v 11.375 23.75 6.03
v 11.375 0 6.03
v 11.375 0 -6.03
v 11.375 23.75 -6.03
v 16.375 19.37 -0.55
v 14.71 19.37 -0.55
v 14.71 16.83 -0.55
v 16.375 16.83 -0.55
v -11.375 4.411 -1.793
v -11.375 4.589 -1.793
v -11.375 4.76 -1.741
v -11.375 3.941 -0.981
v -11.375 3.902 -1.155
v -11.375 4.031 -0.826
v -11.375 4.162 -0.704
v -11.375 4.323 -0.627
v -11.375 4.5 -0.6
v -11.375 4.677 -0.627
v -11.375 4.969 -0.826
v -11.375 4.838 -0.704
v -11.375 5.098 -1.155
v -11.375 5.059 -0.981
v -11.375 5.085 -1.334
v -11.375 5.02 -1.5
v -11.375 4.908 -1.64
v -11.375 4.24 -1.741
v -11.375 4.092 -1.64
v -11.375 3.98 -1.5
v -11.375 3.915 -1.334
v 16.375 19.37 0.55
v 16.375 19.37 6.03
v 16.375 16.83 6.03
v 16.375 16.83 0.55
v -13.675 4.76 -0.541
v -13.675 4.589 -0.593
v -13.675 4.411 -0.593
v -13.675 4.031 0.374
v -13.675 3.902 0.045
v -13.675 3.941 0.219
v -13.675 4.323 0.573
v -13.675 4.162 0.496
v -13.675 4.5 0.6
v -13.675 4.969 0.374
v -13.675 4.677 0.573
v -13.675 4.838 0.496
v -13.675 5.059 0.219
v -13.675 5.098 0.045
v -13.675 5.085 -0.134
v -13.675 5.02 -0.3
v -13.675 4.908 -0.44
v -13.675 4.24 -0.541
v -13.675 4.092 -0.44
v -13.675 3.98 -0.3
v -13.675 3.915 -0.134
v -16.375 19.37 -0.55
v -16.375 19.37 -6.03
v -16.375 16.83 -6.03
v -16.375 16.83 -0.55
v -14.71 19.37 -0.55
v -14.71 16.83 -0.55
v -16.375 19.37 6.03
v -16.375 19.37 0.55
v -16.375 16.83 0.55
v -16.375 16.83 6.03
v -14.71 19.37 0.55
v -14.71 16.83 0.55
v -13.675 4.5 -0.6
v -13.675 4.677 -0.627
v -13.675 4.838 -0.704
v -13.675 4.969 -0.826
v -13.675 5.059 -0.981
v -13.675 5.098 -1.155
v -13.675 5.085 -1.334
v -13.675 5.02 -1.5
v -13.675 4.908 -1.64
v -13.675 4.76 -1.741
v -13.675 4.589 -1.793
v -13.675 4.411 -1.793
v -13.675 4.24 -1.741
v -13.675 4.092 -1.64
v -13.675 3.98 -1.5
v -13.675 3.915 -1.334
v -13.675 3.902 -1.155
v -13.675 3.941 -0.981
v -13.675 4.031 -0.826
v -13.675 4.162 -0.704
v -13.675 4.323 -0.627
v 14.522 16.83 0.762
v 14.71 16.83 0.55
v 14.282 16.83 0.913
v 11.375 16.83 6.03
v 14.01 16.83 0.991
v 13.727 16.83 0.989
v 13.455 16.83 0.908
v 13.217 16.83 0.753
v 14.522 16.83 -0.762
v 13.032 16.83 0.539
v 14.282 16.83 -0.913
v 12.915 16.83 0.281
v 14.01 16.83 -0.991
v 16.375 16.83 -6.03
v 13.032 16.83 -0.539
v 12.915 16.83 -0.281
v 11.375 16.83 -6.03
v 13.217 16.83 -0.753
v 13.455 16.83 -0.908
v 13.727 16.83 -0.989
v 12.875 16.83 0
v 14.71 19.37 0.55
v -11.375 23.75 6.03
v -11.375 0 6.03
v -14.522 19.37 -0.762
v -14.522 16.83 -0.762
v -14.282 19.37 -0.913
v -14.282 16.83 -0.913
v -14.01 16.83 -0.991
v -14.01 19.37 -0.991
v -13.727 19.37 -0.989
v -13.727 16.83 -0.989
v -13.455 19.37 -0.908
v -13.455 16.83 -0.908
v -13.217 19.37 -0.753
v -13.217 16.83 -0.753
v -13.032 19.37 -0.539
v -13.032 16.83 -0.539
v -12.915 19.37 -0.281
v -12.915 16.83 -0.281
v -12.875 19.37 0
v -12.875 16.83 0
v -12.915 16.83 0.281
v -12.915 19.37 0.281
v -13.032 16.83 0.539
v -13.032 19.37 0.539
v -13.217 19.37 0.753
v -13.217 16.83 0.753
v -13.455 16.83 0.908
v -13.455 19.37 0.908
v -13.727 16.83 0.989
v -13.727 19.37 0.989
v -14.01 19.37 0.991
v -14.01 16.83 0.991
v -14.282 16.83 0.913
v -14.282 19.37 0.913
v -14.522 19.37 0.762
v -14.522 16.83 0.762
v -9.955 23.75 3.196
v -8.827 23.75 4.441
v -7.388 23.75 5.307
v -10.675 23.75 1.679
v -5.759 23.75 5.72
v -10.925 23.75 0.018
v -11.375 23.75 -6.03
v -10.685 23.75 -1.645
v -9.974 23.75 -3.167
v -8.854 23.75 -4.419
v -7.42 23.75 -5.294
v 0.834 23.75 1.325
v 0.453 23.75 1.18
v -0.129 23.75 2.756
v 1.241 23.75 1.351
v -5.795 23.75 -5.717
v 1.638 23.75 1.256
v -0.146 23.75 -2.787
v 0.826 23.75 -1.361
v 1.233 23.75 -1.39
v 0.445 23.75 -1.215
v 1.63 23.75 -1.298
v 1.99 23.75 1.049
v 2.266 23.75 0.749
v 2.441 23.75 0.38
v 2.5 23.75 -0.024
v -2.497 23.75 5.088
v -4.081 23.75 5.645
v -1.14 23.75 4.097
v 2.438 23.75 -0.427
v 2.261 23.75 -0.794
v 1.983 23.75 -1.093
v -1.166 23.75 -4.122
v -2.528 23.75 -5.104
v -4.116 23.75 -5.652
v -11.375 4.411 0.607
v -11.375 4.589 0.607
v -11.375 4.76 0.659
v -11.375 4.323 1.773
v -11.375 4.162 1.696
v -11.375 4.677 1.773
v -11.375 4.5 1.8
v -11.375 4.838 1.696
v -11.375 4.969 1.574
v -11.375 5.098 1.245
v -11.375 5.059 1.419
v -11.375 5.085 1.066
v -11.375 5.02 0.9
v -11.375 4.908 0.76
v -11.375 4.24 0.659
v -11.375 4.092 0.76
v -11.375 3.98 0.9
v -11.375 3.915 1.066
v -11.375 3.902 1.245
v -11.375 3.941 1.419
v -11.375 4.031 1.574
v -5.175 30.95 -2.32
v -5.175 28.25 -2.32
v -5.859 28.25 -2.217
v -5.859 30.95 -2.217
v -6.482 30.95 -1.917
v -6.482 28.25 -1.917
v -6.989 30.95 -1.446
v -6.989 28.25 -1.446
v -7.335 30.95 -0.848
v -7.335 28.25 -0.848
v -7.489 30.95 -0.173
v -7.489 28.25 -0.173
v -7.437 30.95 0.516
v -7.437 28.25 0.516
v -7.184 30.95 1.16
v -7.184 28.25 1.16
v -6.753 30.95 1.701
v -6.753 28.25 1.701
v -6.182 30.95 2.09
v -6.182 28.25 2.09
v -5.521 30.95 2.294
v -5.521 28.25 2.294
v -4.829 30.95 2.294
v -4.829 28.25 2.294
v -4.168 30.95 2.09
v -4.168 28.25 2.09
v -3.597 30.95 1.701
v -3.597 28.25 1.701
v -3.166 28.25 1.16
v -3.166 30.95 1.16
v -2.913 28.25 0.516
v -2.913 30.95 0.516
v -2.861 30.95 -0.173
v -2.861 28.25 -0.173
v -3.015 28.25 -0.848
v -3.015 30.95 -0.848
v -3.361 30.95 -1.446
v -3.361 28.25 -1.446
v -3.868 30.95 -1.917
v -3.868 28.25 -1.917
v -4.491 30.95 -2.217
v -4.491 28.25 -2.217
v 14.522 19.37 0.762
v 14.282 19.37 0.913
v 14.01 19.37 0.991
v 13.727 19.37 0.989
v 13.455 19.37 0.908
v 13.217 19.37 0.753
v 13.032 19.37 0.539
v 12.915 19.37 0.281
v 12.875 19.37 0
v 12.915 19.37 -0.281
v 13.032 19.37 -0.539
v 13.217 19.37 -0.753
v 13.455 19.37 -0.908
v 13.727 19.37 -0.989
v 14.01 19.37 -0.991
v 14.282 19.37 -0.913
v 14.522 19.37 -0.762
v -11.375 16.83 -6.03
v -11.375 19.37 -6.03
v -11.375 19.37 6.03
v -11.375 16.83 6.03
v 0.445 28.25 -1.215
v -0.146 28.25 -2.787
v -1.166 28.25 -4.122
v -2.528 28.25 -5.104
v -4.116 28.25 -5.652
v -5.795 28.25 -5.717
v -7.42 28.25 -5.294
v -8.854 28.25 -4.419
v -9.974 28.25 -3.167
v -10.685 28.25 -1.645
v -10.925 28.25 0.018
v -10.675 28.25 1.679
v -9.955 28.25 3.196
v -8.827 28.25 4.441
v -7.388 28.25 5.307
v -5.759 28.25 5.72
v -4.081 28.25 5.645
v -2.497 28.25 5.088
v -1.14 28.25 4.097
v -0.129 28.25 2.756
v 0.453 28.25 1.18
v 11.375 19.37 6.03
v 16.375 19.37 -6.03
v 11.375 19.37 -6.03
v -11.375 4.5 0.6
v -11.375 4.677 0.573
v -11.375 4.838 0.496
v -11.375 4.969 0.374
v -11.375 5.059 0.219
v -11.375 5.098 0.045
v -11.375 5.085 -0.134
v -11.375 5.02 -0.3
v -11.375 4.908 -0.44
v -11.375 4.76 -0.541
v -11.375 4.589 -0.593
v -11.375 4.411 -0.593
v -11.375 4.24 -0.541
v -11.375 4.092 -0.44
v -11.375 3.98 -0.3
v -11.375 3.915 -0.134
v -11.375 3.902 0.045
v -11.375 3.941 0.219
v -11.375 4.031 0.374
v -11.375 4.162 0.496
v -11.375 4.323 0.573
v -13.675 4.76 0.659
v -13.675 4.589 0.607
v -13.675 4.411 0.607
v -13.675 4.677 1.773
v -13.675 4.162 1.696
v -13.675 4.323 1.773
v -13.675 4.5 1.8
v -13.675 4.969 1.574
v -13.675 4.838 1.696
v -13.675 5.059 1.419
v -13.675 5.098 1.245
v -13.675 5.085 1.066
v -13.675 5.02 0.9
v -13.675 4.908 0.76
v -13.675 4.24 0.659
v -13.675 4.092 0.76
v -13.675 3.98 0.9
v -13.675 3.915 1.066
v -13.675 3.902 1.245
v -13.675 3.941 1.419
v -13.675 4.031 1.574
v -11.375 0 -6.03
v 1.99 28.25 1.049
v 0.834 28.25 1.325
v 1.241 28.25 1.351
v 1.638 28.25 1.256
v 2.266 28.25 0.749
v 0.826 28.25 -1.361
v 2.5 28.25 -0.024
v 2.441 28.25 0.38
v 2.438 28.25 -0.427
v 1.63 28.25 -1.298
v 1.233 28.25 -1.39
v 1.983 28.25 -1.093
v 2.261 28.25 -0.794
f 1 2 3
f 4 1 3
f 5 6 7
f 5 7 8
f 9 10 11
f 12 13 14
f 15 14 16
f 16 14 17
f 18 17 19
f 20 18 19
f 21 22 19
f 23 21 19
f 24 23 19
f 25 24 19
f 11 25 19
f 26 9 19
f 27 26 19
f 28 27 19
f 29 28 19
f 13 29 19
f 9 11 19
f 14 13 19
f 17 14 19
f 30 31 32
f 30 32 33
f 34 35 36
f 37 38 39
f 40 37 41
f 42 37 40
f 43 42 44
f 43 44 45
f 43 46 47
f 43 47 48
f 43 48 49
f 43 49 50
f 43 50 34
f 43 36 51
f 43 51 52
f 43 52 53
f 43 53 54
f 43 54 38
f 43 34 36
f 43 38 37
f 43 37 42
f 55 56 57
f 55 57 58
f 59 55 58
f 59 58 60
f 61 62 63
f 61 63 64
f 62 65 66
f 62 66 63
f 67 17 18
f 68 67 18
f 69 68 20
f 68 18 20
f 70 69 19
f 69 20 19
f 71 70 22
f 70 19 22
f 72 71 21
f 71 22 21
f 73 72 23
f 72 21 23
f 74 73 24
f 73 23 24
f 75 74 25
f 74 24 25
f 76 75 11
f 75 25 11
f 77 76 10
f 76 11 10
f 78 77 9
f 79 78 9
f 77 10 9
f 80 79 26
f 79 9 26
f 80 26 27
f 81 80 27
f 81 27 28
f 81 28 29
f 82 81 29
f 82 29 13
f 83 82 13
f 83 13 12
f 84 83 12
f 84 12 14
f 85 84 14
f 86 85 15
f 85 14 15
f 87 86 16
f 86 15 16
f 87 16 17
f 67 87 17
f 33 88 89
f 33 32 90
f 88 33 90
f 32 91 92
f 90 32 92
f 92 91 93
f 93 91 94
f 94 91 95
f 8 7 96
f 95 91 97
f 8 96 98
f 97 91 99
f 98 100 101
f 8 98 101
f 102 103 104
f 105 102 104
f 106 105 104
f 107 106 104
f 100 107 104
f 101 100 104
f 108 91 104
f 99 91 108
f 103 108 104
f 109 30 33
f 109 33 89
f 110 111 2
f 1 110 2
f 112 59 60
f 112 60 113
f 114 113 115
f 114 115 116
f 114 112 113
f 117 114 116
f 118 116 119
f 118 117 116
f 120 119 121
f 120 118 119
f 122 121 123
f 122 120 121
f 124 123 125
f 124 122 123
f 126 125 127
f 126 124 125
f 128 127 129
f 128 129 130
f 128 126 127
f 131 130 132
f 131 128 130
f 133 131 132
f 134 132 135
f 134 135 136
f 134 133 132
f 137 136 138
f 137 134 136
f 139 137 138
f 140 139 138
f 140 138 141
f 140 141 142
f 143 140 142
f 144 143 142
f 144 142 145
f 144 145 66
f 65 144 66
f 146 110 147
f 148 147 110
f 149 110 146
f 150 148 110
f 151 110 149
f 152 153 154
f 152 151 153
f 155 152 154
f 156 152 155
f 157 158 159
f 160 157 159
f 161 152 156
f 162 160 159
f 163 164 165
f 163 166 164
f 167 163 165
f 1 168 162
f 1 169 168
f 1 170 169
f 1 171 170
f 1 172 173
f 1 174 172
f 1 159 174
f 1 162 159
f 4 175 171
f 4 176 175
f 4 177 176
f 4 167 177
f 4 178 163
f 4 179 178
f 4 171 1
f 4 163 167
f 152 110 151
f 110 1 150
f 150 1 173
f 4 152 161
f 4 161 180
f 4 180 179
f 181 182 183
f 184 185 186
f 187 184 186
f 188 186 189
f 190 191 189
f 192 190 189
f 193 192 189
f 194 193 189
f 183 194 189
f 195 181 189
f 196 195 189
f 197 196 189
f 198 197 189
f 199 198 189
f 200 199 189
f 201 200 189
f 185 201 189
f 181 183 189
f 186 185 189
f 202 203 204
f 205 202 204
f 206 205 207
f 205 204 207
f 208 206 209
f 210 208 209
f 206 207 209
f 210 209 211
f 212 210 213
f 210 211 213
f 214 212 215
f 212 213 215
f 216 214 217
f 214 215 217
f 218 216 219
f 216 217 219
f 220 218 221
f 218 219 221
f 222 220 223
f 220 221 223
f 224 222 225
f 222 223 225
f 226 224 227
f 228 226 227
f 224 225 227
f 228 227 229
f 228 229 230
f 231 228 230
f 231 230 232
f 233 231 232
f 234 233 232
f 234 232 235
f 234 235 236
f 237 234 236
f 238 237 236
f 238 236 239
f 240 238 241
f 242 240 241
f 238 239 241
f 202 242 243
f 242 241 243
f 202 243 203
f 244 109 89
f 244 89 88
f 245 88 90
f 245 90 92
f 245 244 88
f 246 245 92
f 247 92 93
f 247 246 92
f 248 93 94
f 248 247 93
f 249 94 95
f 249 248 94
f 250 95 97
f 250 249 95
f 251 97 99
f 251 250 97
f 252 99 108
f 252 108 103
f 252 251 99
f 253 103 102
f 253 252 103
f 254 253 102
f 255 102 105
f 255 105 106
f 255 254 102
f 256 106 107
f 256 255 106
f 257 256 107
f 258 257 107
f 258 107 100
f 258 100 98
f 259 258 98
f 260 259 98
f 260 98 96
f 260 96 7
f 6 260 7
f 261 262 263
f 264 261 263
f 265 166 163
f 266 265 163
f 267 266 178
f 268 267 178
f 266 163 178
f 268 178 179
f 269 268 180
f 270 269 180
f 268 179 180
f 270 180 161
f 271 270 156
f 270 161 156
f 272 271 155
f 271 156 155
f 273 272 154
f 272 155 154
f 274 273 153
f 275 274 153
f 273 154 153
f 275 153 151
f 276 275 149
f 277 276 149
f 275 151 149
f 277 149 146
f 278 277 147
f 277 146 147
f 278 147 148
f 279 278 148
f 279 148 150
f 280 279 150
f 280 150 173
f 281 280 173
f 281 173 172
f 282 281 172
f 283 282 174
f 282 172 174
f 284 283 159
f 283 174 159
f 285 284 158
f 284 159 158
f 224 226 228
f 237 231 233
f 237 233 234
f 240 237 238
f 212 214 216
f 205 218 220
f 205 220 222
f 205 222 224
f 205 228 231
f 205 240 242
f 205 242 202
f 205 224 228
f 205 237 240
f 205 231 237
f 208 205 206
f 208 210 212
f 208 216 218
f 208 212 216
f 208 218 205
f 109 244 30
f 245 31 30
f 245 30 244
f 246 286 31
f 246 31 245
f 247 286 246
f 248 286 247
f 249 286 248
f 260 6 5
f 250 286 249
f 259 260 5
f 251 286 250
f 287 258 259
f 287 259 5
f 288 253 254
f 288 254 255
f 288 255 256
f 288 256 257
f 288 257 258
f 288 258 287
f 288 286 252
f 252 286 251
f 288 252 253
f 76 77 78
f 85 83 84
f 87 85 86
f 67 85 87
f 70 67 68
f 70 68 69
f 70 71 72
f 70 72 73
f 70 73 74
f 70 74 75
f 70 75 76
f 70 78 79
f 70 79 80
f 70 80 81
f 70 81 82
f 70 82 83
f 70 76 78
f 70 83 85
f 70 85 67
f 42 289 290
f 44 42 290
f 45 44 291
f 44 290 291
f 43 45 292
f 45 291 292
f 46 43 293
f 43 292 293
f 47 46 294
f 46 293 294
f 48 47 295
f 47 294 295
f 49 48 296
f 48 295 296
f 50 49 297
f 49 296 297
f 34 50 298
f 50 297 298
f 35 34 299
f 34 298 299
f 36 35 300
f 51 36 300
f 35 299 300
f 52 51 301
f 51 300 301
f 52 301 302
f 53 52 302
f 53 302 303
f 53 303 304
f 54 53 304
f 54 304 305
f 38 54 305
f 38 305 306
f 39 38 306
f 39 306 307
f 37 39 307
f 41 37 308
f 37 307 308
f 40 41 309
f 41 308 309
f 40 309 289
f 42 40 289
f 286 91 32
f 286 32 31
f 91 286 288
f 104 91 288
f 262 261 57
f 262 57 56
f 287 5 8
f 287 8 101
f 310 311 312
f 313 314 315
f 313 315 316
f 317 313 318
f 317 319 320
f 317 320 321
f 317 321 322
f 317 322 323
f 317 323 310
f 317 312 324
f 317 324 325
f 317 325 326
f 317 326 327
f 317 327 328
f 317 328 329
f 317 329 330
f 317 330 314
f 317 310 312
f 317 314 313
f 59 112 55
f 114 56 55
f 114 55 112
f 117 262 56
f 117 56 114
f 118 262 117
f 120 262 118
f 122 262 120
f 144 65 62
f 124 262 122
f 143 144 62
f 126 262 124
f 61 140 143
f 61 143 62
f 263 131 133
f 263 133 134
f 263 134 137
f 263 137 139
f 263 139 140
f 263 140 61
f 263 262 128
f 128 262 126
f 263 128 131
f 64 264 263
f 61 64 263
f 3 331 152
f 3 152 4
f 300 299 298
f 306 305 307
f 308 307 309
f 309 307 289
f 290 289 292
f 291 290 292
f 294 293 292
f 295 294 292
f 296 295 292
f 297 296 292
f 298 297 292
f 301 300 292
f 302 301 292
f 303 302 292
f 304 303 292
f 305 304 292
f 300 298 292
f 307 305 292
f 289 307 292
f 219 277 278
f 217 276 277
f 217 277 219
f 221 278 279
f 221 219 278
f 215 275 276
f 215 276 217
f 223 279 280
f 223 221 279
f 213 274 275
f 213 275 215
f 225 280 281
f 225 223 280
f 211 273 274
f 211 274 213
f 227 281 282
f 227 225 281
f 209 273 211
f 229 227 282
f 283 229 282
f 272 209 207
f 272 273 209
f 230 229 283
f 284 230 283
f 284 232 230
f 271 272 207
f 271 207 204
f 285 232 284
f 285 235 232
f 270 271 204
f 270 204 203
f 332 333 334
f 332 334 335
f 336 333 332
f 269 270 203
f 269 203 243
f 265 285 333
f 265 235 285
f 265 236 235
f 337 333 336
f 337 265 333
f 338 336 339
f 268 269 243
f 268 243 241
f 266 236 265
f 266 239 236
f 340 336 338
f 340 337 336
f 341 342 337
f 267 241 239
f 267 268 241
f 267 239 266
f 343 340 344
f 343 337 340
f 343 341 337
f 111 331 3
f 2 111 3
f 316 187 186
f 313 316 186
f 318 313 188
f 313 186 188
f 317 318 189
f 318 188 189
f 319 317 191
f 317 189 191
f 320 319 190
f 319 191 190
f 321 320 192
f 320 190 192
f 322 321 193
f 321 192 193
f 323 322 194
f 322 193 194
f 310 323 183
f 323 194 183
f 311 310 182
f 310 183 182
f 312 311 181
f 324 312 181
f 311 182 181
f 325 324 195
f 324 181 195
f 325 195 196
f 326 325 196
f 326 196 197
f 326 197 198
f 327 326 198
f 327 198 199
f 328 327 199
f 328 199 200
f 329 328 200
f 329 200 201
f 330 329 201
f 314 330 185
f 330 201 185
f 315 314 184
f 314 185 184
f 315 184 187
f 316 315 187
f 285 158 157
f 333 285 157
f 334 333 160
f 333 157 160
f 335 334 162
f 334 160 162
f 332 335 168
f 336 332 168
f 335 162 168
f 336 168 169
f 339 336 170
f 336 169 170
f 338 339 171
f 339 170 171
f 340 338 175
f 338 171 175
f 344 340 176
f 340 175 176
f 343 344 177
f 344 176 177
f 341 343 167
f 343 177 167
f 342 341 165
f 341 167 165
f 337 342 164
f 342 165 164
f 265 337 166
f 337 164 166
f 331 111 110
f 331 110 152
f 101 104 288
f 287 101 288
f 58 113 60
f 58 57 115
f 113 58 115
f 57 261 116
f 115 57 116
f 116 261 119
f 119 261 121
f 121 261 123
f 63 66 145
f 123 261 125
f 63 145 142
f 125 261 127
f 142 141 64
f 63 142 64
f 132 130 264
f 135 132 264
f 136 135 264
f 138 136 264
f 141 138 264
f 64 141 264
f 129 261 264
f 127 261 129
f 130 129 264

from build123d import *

# Parameters (mm, degrees)
SKETCH1_W             = 22.75
SKETCH1_H             = 12.06
BOSS_EXTRUDE1_DEPTH   = 23.75
SKETCH2_W             = 12.06
SKETCH2_H             = 2.54
BOSS_EXTRUDE2_DEPTH   = 5
SKETCH3_W             = 12.06
SKETCH3_H             = 2.54
BOSS_EXTRUDE3_DEPTH   = 5
CUT_EXTRUDE1_DEPTH    = 2.54
CUT_EXTRUDE2_DEPTH    = 2.54
BOSS_EXTRUDE4_DEPTH   = 4.5
SKETCH7_R             = 2.32
BOSS_EXTRUDE5_DEPTH   = 2.7
SKETCH8_R             = 0.6
BOSS_EXTRUDE7_DEPTH   = 2.3
BOSS_EXTRUDE7_2_DEPTH = 2.3
BOSS_EXTRUDE7_3_DEPTH = 2.3


with BuildPart() as part:
    # Sketch1 → Boss-Extrude1 (new body)
    with BuildSketch(Plane(origin=(0, 0, 0), x_dir=(1, 0, 0), z_dir=(0, 1, 0))):
        Rectangle(SKETCH1_W, SKETCH1_H)
    extrude(amount=BOSS_EXTRUDE1_DEPTH)

    # Sketch6 → Boss-Extrude4 (add)
    with BuildSketch(Plane(origin=(0, 23.75, 0), x_dir=(1, 0, 0), z_dir=(0, 1, 0))):
        with BuildLine():
            ThreePointArc((0.452610218, -1.180043744), (2.49996378, 0.023579109), (0.445253368, 1.214599556))
            ThreePointArc((0.445253368, 1.214599556), (-10.924972865, -0.017665131), (0.452610218, -1.180043744))
        make_face()
    extrude(amount=BOSS_EXTRUDE4_DEPTH)

    # Sketch7 → Boss-Extrude5 (add)
    with BuildSketch(Plane(origin=(0, 28.25, 0), x_dir=(1, 0, 0), z_dir=(0, 1, 0))):
        with Locations(Location((-5.175, 0, 0), (0, 0, 90))):
            Circle(SKETCH7_R)
    extrude(amount=BOSS_EXTRUDE5_DEPTH)


with BuildPart() as body_2:
    # Sketch2 → Boss-Extrude2 (new body)
    with BuildSketch(Plane(origin=(11.375, 0, 0), x_dir=(0, 0, -1), z_dir=(1, 0, 0))):
        with Locations((0, 18.1)):
            Rectangle(SKETCH2_W, SKETCH2_H)
    extrude(amount=BOSS_EXTRUDE2_DEPTH)

    # Sketch5 → Cut-Extrude2 (cut)
    with BuildSketch(Plane(origin=(0, 19.37, 0), x_dir=(1, 0, 0), z_dir=(0, 1, 0))):
        with BuildLine():
            Line((14.710164654, 0.55), (16.375, 0.55))
            Line((16.375, 0.55), (16.375, -0.55))
            Line((16.375, -0.55), (14.710164654, -0.55))
            ThreePointArc((14.710164654, -0.55), (12.875, 0), (14.710164654, 0.55))
        make_face()
    extrude(amount=-CUT_EXTRUDE2_DEPTH, mode=Mode.SUBTRACT)


with BuildPart() as body_3:
    # Sketch3 → Boss-Extrude3 (new body)
    with BuildSketch(Plane.ZY.offset(11.375)):
        with Locations((0, 18.1)):
            Rectangle(SKETCH3_W, SKETCH3_H)
    extrude(amount=BOSS_EXTRUDE3_DEPTH)

    # Sketch4 → Cut-Extrude1 (cut)
    with BuildSketch(Plane(origin=(0, 19.37, 0), x_dir=(1, 0, 0), z_dir=(0, 1, 0))):
        with BuildLine():
            Line((-16.375, 0.55), (-14.710164654, 0.55))
            ThreePointArc((-14.710164654, 0.55), (-12.875, 0), (-14.710164654, -0.55))
            Line((-14.710164654, -0.55), (-16.375, -0.55))
            Line((-16.375, -0.55), (-16.375, 0.55))
        make_face()
        with BuildLine():
            Line((16.375, -0.55), (14.710164654, -0.55))
            ThreePointArc((14.710164654, -0.55), (12.875, 0), (14.710164654, 0.55))
            Line((14.710164654, 0.55), (16.375, 0.55))
            Line((16.375, 0.55), (16.375, -0.55))
        make_face()
    extrude(amount=-CUT_EXTRUDE1_DEPTH, mode=Mode.SUBTRACT)


with BuildPart() as body_4:
    # Sketch8 → Boss-Extrude7 (new body)
    with BuildSketch(Plane.ZY.offset(11.375)):
        with Locations((0, 4.5)):
            Circle(SKETCH8_R)
    extrude(amount=BOSS_EXTRUDE7_DEPTH)


with BuildPart() as body_5:
    # Sketch8 → Boss-Extrude7 2 (new body)
    with BuildSketch(Plane.ZY.offset(11.375)):
        with Locations((-1.2, 4.5)):
            Circle(SKETCH8_R)
    extrude(amount=BOSS_EXTRUDE7_2_DEPTH)


with BuildPart() as body_6:
    # Sketch8 → Boss-Extrude7 3 (new body)
    with BuildSketch(Plane.ZY.offset(11.375)):
        with Locations((1.2, 4.5)):
            Circle(SKETCH8_R)
    extrude(amount=BOSS_EXTRUDE7_3_DEPTH)


solid = Compound([part.part, body_2.part, body_3.part, body_4.part, body_5.part, body_6.part])
